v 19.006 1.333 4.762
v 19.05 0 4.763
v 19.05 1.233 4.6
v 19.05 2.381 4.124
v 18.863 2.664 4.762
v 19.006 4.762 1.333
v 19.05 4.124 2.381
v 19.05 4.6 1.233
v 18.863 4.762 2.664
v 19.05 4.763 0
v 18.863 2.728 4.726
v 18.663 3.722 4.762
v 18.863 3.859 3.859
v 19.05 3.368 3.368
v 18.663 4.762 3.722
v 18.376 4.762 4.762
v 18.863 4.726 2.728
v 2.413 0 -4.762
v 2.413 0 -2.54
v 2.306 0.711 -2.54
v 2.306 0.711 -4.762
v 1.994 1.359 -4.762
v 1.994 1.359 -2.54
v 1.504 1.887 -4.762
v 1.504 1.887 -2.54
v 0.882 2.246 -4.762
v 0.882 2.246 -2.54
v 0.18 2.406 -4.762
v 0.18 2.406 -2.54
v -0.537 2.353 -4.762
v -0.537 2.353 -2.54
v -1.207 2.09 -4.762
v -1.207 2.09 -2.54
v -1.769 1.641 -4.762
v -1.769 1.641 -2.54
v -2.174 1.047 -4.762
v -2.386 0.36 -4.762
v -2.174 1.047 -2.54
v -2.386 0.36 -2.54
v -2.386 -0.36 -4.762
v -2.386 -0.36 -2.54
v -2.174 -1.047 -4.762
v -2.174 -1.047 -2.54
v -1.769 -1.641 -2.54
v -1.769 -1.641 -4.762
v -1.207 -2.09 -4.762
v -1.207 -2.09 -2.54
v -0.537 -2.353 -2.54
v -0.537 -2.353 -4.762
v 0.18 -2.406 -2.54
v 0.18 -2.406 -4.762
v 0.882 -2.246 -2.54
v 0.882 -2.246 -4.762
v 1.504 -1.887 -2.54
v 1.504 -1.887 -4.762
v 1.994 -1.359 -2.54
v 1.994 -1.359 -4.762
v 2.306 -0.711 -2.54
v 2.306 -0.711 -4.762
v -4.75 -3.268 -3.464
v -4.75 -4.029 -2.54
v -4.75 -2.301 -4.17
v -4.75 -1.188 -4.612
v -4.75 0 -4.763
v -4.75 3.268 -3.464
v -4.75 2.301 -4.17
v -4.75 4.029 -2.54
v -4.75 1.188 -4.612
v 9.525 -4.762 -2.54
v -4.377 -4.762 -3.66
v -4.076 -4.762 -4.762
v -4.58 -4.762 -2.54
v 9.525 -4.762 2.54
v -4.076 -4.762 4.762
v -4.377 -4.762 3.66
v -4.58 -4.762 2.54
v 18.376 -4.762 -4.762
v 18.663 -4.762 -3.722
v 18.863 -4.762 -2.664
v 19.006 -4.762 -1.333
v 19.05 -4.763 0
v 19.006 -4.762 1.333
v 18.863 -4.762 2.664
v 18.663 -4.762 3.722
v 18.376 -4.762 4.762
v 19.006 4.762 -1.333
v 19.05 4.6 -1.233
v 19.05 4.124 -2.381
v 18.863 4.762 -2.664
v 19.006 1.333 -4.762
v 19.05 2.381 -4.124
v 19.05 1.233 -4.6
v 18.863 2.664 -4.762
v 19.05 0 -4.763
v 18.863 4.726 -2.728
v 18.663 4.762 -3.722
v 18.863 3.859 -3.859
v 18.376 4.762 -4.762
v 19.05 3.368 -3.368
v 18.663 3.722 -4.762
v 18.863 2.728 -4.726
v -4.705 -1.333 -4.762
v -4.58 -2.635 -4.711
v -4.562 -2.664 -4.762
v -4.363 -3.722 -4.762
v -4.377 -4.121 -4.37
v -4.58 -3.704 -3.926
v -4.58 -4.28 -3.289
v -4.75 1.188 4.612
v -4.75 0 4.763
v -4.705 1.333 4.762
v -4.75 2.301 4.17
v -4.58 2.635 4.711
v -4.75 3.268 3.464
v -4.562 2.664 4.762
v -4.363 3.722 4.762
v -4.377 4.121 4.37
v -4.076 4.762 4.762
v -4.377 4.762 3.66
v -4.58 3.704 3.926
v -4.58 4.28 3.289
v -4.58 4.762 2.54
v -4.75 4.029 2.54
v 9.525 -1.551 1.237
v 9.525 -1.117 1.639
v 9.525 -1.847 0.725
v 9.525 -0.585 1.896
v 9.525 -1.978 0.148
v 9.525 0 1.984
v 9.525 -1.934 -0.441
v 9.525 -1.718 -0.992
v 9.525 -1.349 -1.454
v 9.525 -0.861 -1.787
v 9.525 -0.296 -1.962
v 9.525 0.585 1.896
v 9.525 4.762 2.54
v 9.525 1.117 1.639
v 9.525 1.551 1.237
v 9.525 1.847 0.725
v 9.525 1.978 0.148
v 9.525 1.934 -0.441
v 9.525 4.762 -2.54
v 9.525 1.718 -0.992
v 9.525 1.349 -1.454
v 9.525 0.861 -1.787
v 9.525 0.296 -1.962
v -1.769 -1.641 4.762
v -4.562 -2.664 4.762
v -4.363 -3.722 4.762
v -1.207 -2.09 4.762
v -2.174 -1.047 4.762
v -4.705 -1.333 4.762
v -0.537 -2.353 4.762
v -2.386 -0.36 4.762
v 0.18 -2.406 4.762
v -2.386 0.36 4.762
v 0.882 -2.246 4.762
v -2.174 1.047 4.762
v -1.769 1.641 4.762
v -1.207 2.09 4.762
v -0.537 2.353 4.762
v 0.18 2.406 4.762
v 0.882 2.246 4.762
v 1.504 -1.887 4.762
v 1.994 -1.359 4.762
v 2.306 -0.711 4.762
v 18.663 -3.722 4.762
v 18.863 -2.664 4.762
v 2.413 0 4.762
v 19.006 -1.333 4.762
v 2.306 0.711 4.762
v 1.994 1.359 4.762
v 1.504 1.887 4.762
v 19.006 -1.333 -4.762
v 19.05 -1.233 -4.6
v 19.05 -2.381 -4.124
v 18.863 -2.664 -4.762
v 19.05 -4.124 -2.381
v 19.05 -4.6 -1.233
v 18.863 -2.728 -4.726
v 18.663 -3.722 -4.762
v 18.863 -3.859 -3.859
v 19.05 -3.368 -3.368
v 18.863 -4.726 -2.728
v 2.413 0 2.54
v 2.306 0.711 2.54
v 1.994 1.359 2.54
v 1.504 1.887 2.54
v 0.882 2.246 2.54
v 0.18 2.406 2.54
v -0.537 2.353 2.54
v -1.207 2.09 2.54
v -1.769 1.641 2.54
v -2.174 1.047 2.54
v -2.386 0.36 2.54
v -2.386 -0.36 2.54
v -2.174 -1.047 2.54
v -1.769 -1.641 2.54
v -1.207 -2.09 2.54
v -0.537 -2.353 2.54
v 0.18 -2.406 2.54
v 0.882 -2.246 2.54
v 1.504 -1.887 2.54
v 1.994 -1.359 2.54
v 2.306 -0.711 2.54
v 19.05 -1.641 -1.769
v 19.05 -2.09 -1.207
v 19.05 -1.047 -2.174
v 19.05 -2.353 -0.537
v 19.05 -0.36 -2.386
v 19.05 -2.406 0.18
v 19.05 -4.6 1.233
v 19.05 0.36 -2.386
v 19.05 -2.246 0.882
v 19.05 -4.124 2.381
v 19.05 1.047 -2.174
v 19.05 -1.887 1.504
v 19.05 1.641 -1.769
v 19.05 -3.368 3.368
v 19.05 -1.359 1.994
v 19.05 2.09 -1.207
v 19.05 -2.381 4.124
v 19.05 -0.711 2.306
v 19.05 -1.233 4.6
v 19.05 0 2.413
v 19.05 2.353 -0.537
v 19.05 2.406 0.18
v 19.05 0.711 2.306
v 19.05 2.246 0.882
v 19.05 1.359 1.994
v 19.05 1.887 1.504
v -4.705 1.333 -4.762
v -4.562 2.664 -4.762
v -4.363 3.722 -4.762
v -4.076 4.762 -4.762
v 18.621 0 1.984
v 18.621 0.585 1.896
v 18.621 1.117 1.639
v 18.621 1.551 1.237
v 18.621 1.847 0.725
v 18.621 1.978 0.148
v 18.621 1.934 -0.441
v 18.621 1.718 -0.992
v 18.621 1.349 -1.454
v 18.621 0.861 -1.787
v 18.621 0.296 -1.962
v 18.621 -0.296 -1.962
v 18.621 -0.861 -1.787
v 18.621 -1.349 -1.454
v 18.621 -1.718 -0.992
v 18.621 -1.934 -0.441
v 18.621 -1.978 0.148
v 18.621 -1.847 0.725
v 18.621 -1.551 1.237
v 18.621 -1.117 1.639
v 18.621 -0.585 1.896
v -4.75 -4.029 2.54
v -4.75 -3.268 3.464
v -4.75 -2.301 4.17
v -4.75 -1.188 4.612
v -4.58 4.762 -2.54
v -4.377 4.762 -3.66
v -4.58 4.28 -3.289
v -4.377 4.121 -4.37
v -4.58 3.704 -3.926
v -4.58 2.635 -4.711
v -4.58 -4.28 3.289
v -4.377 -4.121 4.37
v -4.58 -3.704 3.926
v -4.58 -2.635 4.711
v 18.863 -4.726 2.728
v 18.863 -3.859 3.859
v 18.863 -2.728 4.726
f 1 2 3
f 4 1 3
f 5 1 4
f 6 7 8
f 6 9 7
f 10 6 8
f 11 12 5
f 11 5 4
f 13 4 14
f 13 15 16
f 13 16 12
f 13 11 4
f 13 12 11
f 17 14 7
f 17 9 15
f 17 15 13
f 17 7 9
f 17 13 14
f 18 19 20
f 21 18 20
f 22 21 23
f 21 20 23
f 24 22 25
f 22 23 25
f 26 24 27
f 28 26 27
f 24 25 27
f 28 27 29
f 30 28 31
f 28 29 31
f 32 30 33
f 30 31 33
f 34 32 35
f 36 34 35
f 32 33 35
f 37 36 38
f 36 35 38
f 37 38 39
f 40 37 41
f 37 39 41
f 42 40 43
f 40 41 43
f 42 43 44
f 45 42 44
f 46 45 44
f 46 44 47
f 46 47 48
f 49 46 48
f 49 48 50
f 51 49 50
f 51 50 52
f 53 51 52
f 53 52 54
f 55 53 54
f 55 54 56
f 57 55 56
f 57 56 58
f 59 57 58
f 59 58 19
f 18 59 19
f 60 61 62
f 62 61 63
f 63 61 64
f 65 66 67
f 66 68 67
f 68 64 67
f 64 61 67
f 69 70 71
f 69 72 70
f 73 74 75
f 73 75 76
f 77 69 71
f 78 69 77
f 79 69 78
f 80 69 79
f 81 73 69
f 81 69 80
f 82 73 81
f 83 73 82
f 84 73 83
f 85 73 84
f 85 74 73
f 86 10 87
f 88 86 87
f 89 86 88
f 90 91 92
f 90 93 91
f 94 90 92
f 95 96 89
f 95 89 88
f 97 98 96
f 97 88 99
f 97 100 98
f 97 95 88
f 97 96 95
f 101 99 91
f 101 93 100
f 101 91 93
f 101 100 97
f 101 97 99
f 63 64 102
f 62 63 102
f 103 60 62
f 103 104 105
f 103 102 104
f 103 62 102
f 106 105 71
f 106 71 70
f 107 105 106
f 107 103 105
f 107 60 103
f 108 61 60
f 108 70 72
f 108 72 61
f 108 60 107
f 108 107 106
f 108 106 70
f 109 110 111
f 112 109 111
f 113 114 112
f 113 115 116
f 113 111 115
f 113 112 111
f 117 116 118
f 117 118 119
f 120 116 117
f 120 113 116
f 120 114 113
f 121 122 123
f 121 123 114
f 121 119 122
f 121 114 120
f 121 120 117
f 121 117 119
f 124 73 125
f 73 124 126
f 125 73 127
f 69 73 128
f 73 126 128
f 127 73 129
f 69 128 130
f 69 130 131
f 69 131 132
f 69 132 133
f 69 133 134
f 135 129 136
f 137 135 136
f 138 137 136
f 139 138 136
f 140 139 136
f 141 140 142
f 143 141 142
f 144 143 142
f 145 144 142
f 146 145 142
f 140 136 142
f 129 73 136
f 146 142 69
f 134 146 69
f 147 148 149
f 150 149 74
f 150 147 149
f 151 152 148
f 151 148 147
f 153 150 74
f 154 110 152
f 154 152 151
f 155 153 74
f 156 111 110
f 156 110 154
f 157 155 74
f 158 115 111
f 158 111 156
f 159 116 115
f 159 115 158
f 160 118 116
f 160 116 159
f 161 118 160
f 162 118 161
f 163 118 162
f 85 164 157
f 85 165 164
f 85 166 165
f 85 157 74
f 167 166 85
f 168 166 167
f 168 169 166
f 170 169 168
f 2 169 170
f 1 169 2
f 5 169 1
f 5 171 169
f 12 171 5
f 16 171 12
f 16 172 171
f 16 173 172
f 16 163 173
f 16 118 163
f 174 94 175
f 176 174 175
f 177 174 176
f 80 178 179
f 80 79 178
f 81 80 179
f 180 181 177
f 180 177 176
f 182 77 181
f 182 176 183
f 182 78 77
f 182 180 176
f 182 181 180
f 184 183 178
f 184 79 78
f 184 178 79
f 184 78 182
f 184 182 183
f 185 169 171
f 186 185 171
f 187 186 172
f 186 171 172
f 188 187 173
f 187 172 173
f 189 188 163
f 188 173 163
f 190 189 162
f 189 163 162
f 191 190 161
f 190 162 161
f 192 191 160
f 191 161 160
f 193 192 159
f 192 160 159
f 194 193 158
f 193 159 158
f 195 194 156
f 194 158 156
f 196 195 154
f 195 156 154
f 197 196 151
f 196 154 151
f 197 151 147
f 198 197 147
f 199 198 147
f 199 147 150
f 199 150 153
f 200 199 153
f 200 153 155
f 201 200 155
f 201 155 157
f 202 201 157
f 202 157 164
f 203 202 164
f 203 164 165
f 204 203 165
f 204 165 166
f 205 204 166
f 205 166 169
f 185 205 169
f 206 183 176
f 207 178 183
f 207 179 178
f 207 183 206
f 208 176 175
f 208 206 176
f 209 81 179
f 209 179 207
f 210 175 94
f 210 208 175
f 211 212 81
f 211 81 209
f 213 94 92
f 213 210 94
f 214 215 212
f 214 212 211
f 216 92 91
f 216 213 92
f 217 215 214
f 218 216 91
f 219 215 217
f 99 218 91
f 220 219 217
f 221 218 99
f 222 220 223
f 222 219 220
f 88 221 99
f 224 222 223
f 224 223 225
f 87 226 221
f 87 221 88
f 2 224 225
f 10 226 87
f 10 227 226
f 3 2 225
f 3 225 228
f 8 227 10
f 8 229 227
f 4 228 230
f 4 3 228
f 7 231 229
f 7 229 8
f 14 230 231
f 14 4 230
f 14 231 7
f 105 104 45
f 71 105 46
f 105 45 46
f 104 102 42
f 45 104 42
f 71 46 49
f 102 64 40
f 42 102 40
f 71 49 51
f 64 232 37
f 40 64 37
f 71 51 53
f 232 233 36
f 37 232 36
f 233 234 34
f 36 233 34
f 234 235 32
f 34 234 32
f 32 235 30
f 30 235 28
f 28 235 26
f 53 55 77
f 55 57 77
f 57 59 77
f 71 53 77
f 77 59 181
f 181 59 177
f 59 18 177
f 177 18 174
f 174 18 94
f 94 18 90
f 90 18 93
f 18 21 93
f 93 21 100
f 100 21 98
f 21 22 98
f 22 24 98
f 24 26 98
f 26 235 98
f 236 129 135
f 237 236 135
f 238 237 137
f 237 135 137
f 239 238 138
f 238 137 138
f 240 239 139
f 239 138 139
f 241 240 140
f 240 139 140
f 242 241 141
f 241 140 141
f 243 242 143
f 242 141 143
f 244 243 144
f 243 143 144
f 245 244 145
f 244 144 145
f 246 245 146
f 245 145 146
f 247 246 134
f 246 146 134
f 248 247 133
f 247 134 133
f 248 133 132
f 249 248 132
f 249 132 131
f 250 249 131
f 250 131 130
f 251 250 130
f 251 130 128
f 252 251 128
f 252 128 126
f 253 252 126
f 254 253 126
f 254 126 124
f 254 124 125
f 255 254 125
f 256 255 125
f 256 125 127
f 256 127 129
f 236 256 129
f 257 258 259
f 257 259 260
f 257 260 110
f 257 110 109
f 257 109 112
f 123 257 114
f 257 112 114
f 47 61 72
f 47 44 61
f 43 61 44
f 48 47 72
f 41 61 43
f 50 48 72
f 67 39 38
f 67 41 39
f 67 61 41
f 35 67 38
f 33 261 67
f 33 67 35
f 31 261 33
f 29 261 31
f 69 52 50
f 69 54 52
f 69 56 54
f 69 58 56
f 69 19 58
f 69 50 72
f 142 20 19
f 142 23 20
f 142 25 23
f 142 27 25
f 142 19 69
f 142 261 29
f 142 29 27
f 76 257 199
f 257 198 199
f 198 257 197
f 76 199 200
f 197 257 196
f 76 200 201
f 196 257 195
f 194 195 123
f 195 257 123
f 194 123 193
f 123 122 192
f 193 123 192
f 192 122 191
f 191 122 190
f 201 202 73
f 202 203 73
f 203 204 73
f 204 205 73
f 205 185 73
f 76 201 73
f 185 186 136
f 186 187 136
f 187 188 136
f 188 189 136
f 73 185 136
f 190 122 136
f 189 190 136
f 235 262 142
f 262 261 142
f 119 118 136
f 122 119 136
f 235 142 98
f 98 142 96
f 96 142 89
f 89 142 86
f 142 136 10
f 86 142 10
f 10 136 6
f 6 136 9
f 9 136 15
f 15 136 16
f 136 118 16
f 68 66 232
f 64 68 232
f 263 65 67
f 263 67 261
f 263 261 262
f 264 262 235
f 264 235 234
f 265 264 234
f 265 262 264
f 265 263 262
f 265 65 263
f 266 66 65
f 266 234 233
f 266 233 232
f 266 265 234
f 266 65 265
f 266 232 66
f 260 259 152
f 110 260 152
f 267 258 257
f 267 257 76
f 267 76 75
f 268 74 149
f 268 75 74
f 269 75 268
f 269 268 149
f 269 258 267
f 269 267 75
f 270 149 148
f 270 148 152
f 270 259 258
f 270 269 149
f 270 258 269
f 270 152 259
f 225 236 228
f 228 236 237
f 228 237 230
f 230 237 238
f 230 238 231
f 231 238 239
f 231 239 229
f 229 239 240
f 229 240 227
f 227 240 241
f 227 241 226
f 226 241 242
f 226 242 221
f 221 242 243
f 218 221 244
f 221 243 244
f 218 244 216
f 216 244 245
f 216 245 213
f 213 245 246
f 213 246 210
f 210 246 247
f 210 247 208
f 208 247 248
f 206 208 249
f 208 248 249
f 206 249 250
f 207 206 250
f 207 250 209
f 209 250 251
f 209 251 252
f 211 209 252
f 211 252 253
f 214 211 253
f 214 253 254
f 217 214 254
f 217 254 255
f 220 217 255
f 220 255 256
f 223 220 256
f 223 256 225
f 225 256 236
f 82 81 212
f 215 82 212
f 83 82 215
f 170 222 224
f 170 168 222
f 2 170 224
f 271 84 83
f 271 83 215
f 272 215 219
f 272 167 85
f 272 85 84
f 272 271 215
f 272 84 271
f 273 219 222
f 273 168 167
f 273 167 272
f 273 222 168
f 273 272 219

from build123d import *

# Parameters (mm, degrees)
BOSS_EXTRUDE1_DEPTH      = 4.7625
BOSS_EXTRUDE1_DEPTH_BACK = 4.7625
SKETCH1_W                = 23.7998
SKETCH1_H                = 9.525
CUT_EXTRUDE1_DEPTH       = 4.7625
CUT_EXTRUDE1_DEPTH_BACK  = 4.7625
SKETCH2_W                = 14.2748
SKETCH2_H                = 5.08
HOLE1_D                  = 3.96748
HOLE1_DEPTH              = 7.874
HOLE1_CSINK_D            = 4.826
HOLE1_CSINK_ANGLE        = 90
HOLE2_D                  = 3.96748
HOLE3_D                  = 4.826


with BuildPart() as part:
    # Sketch1 → Boss-Extrude1 (new, two sides: drawn at the far end of the back side and taken through both)
    with BuildSketch(Plane.XY.offset(-BOSS_EXTRUDE1_DEPTH_BACK)):
        with Locations((7.1501, 0)):
            Rectangle(SKETCH1_W, SKETCH1_H)
    extrude(amount=BOSS_EXTRUDE1_DEPTH + BOSS_EXTRUDE1_DEPTH_BACK)

    # Sketch2 → Cut-Extrude1 (cut, two sides: drawn at the far end of the back side and taken through both)
    with BuildSketch(Plane(origin=(0, 0, 0), x_dir=(1, 0, 0), z_dir=(0, 1, 0)).offset(-CUT_EXTRUDE1_DEPTH_BACK)):
        with Locations((2.3876, 0)):
            Rectangle(SKETCH2_W, SKETCH2_H)
    extrude(amount=CUT_EXTRUDE1_DEPTH + CUT_EXTRUDE1_DEPTH_BACK, mode=Mode.SUBTRACT)

    # Hole1
    with Locations(Plane(origin=(19.05, 0, 0), x_dir=(0, 0, -1), z_dir=(1, 0, 0))):
        with Locations((0, 0)):
            CounterSinkHole(HOLE1_D / 2, HOLE1_CSINK_D / 2, depth=HOLE1_DEPTH, counter_sink_angle=HOLE1_CSINK_ANGLE)

    # Hole2 (through all)
    with Locations(Plane(origin=(11.176, 0, 0), x_dir=(0, 0, -1), z_dir=(1, 0, 0))):
        with Locations((0, 0)):
            Hole(HOLE2_D / 2)

    # Hole3 (through all)
    with Locations(Plane(origin=(0, 0, -4.7625), x_dir=(-1, 0, 0), z_dir=(0, 0, -1))):
        with Locations((0, 0)):
            Hole(HOLE3_D / 2)

    # Sketch9 → Cut-Revolve1 (revolve, cut)
    with BuildSketch(Plane.XY):
        with BuildLine():
            Line((19.05, 0), (19.05, 4.7625))
            ThreePointArc((19.05, 4.7625), (18.092047749, 7.310175466), (16.51, 9.525))
            Line((16.51, 9.525), (23.8125, 9.525))
            Line((23.8125, 9.525), (23.8125, 0))
            Line((23.8125, 0), (19.05, 0))
        make_face()
    revolve(axis=Axis((23.8125, 0, 0), (-1, 0, 0)), mode=Mode.SUBTRACT)

    # Sketch10 → Cut-Revolve2 (revolve, cut)
    with BuildSketch(Plane.XY):
        with BuildLine():
            Line((-9.5123, 0), (-9.5123, 9.525))
            Line((-9.5123, 9.525), (-2.2098, 9.525))
            ThreePointArc((-2.2098, 9.525), (-3.791847749, 7.310175466), (-4.7498, 4.7625))
            Line((-4.7498, 4.7625), (-4.7498, 0))
            Line((-4.7498, 0), (-9.5123, 0))
        make_face()
    revolve(axis=Axis((-4.7498, 0, 0), (-1, 0, 0)), mode=Mode.SUBTRACT)


solid = part.part
